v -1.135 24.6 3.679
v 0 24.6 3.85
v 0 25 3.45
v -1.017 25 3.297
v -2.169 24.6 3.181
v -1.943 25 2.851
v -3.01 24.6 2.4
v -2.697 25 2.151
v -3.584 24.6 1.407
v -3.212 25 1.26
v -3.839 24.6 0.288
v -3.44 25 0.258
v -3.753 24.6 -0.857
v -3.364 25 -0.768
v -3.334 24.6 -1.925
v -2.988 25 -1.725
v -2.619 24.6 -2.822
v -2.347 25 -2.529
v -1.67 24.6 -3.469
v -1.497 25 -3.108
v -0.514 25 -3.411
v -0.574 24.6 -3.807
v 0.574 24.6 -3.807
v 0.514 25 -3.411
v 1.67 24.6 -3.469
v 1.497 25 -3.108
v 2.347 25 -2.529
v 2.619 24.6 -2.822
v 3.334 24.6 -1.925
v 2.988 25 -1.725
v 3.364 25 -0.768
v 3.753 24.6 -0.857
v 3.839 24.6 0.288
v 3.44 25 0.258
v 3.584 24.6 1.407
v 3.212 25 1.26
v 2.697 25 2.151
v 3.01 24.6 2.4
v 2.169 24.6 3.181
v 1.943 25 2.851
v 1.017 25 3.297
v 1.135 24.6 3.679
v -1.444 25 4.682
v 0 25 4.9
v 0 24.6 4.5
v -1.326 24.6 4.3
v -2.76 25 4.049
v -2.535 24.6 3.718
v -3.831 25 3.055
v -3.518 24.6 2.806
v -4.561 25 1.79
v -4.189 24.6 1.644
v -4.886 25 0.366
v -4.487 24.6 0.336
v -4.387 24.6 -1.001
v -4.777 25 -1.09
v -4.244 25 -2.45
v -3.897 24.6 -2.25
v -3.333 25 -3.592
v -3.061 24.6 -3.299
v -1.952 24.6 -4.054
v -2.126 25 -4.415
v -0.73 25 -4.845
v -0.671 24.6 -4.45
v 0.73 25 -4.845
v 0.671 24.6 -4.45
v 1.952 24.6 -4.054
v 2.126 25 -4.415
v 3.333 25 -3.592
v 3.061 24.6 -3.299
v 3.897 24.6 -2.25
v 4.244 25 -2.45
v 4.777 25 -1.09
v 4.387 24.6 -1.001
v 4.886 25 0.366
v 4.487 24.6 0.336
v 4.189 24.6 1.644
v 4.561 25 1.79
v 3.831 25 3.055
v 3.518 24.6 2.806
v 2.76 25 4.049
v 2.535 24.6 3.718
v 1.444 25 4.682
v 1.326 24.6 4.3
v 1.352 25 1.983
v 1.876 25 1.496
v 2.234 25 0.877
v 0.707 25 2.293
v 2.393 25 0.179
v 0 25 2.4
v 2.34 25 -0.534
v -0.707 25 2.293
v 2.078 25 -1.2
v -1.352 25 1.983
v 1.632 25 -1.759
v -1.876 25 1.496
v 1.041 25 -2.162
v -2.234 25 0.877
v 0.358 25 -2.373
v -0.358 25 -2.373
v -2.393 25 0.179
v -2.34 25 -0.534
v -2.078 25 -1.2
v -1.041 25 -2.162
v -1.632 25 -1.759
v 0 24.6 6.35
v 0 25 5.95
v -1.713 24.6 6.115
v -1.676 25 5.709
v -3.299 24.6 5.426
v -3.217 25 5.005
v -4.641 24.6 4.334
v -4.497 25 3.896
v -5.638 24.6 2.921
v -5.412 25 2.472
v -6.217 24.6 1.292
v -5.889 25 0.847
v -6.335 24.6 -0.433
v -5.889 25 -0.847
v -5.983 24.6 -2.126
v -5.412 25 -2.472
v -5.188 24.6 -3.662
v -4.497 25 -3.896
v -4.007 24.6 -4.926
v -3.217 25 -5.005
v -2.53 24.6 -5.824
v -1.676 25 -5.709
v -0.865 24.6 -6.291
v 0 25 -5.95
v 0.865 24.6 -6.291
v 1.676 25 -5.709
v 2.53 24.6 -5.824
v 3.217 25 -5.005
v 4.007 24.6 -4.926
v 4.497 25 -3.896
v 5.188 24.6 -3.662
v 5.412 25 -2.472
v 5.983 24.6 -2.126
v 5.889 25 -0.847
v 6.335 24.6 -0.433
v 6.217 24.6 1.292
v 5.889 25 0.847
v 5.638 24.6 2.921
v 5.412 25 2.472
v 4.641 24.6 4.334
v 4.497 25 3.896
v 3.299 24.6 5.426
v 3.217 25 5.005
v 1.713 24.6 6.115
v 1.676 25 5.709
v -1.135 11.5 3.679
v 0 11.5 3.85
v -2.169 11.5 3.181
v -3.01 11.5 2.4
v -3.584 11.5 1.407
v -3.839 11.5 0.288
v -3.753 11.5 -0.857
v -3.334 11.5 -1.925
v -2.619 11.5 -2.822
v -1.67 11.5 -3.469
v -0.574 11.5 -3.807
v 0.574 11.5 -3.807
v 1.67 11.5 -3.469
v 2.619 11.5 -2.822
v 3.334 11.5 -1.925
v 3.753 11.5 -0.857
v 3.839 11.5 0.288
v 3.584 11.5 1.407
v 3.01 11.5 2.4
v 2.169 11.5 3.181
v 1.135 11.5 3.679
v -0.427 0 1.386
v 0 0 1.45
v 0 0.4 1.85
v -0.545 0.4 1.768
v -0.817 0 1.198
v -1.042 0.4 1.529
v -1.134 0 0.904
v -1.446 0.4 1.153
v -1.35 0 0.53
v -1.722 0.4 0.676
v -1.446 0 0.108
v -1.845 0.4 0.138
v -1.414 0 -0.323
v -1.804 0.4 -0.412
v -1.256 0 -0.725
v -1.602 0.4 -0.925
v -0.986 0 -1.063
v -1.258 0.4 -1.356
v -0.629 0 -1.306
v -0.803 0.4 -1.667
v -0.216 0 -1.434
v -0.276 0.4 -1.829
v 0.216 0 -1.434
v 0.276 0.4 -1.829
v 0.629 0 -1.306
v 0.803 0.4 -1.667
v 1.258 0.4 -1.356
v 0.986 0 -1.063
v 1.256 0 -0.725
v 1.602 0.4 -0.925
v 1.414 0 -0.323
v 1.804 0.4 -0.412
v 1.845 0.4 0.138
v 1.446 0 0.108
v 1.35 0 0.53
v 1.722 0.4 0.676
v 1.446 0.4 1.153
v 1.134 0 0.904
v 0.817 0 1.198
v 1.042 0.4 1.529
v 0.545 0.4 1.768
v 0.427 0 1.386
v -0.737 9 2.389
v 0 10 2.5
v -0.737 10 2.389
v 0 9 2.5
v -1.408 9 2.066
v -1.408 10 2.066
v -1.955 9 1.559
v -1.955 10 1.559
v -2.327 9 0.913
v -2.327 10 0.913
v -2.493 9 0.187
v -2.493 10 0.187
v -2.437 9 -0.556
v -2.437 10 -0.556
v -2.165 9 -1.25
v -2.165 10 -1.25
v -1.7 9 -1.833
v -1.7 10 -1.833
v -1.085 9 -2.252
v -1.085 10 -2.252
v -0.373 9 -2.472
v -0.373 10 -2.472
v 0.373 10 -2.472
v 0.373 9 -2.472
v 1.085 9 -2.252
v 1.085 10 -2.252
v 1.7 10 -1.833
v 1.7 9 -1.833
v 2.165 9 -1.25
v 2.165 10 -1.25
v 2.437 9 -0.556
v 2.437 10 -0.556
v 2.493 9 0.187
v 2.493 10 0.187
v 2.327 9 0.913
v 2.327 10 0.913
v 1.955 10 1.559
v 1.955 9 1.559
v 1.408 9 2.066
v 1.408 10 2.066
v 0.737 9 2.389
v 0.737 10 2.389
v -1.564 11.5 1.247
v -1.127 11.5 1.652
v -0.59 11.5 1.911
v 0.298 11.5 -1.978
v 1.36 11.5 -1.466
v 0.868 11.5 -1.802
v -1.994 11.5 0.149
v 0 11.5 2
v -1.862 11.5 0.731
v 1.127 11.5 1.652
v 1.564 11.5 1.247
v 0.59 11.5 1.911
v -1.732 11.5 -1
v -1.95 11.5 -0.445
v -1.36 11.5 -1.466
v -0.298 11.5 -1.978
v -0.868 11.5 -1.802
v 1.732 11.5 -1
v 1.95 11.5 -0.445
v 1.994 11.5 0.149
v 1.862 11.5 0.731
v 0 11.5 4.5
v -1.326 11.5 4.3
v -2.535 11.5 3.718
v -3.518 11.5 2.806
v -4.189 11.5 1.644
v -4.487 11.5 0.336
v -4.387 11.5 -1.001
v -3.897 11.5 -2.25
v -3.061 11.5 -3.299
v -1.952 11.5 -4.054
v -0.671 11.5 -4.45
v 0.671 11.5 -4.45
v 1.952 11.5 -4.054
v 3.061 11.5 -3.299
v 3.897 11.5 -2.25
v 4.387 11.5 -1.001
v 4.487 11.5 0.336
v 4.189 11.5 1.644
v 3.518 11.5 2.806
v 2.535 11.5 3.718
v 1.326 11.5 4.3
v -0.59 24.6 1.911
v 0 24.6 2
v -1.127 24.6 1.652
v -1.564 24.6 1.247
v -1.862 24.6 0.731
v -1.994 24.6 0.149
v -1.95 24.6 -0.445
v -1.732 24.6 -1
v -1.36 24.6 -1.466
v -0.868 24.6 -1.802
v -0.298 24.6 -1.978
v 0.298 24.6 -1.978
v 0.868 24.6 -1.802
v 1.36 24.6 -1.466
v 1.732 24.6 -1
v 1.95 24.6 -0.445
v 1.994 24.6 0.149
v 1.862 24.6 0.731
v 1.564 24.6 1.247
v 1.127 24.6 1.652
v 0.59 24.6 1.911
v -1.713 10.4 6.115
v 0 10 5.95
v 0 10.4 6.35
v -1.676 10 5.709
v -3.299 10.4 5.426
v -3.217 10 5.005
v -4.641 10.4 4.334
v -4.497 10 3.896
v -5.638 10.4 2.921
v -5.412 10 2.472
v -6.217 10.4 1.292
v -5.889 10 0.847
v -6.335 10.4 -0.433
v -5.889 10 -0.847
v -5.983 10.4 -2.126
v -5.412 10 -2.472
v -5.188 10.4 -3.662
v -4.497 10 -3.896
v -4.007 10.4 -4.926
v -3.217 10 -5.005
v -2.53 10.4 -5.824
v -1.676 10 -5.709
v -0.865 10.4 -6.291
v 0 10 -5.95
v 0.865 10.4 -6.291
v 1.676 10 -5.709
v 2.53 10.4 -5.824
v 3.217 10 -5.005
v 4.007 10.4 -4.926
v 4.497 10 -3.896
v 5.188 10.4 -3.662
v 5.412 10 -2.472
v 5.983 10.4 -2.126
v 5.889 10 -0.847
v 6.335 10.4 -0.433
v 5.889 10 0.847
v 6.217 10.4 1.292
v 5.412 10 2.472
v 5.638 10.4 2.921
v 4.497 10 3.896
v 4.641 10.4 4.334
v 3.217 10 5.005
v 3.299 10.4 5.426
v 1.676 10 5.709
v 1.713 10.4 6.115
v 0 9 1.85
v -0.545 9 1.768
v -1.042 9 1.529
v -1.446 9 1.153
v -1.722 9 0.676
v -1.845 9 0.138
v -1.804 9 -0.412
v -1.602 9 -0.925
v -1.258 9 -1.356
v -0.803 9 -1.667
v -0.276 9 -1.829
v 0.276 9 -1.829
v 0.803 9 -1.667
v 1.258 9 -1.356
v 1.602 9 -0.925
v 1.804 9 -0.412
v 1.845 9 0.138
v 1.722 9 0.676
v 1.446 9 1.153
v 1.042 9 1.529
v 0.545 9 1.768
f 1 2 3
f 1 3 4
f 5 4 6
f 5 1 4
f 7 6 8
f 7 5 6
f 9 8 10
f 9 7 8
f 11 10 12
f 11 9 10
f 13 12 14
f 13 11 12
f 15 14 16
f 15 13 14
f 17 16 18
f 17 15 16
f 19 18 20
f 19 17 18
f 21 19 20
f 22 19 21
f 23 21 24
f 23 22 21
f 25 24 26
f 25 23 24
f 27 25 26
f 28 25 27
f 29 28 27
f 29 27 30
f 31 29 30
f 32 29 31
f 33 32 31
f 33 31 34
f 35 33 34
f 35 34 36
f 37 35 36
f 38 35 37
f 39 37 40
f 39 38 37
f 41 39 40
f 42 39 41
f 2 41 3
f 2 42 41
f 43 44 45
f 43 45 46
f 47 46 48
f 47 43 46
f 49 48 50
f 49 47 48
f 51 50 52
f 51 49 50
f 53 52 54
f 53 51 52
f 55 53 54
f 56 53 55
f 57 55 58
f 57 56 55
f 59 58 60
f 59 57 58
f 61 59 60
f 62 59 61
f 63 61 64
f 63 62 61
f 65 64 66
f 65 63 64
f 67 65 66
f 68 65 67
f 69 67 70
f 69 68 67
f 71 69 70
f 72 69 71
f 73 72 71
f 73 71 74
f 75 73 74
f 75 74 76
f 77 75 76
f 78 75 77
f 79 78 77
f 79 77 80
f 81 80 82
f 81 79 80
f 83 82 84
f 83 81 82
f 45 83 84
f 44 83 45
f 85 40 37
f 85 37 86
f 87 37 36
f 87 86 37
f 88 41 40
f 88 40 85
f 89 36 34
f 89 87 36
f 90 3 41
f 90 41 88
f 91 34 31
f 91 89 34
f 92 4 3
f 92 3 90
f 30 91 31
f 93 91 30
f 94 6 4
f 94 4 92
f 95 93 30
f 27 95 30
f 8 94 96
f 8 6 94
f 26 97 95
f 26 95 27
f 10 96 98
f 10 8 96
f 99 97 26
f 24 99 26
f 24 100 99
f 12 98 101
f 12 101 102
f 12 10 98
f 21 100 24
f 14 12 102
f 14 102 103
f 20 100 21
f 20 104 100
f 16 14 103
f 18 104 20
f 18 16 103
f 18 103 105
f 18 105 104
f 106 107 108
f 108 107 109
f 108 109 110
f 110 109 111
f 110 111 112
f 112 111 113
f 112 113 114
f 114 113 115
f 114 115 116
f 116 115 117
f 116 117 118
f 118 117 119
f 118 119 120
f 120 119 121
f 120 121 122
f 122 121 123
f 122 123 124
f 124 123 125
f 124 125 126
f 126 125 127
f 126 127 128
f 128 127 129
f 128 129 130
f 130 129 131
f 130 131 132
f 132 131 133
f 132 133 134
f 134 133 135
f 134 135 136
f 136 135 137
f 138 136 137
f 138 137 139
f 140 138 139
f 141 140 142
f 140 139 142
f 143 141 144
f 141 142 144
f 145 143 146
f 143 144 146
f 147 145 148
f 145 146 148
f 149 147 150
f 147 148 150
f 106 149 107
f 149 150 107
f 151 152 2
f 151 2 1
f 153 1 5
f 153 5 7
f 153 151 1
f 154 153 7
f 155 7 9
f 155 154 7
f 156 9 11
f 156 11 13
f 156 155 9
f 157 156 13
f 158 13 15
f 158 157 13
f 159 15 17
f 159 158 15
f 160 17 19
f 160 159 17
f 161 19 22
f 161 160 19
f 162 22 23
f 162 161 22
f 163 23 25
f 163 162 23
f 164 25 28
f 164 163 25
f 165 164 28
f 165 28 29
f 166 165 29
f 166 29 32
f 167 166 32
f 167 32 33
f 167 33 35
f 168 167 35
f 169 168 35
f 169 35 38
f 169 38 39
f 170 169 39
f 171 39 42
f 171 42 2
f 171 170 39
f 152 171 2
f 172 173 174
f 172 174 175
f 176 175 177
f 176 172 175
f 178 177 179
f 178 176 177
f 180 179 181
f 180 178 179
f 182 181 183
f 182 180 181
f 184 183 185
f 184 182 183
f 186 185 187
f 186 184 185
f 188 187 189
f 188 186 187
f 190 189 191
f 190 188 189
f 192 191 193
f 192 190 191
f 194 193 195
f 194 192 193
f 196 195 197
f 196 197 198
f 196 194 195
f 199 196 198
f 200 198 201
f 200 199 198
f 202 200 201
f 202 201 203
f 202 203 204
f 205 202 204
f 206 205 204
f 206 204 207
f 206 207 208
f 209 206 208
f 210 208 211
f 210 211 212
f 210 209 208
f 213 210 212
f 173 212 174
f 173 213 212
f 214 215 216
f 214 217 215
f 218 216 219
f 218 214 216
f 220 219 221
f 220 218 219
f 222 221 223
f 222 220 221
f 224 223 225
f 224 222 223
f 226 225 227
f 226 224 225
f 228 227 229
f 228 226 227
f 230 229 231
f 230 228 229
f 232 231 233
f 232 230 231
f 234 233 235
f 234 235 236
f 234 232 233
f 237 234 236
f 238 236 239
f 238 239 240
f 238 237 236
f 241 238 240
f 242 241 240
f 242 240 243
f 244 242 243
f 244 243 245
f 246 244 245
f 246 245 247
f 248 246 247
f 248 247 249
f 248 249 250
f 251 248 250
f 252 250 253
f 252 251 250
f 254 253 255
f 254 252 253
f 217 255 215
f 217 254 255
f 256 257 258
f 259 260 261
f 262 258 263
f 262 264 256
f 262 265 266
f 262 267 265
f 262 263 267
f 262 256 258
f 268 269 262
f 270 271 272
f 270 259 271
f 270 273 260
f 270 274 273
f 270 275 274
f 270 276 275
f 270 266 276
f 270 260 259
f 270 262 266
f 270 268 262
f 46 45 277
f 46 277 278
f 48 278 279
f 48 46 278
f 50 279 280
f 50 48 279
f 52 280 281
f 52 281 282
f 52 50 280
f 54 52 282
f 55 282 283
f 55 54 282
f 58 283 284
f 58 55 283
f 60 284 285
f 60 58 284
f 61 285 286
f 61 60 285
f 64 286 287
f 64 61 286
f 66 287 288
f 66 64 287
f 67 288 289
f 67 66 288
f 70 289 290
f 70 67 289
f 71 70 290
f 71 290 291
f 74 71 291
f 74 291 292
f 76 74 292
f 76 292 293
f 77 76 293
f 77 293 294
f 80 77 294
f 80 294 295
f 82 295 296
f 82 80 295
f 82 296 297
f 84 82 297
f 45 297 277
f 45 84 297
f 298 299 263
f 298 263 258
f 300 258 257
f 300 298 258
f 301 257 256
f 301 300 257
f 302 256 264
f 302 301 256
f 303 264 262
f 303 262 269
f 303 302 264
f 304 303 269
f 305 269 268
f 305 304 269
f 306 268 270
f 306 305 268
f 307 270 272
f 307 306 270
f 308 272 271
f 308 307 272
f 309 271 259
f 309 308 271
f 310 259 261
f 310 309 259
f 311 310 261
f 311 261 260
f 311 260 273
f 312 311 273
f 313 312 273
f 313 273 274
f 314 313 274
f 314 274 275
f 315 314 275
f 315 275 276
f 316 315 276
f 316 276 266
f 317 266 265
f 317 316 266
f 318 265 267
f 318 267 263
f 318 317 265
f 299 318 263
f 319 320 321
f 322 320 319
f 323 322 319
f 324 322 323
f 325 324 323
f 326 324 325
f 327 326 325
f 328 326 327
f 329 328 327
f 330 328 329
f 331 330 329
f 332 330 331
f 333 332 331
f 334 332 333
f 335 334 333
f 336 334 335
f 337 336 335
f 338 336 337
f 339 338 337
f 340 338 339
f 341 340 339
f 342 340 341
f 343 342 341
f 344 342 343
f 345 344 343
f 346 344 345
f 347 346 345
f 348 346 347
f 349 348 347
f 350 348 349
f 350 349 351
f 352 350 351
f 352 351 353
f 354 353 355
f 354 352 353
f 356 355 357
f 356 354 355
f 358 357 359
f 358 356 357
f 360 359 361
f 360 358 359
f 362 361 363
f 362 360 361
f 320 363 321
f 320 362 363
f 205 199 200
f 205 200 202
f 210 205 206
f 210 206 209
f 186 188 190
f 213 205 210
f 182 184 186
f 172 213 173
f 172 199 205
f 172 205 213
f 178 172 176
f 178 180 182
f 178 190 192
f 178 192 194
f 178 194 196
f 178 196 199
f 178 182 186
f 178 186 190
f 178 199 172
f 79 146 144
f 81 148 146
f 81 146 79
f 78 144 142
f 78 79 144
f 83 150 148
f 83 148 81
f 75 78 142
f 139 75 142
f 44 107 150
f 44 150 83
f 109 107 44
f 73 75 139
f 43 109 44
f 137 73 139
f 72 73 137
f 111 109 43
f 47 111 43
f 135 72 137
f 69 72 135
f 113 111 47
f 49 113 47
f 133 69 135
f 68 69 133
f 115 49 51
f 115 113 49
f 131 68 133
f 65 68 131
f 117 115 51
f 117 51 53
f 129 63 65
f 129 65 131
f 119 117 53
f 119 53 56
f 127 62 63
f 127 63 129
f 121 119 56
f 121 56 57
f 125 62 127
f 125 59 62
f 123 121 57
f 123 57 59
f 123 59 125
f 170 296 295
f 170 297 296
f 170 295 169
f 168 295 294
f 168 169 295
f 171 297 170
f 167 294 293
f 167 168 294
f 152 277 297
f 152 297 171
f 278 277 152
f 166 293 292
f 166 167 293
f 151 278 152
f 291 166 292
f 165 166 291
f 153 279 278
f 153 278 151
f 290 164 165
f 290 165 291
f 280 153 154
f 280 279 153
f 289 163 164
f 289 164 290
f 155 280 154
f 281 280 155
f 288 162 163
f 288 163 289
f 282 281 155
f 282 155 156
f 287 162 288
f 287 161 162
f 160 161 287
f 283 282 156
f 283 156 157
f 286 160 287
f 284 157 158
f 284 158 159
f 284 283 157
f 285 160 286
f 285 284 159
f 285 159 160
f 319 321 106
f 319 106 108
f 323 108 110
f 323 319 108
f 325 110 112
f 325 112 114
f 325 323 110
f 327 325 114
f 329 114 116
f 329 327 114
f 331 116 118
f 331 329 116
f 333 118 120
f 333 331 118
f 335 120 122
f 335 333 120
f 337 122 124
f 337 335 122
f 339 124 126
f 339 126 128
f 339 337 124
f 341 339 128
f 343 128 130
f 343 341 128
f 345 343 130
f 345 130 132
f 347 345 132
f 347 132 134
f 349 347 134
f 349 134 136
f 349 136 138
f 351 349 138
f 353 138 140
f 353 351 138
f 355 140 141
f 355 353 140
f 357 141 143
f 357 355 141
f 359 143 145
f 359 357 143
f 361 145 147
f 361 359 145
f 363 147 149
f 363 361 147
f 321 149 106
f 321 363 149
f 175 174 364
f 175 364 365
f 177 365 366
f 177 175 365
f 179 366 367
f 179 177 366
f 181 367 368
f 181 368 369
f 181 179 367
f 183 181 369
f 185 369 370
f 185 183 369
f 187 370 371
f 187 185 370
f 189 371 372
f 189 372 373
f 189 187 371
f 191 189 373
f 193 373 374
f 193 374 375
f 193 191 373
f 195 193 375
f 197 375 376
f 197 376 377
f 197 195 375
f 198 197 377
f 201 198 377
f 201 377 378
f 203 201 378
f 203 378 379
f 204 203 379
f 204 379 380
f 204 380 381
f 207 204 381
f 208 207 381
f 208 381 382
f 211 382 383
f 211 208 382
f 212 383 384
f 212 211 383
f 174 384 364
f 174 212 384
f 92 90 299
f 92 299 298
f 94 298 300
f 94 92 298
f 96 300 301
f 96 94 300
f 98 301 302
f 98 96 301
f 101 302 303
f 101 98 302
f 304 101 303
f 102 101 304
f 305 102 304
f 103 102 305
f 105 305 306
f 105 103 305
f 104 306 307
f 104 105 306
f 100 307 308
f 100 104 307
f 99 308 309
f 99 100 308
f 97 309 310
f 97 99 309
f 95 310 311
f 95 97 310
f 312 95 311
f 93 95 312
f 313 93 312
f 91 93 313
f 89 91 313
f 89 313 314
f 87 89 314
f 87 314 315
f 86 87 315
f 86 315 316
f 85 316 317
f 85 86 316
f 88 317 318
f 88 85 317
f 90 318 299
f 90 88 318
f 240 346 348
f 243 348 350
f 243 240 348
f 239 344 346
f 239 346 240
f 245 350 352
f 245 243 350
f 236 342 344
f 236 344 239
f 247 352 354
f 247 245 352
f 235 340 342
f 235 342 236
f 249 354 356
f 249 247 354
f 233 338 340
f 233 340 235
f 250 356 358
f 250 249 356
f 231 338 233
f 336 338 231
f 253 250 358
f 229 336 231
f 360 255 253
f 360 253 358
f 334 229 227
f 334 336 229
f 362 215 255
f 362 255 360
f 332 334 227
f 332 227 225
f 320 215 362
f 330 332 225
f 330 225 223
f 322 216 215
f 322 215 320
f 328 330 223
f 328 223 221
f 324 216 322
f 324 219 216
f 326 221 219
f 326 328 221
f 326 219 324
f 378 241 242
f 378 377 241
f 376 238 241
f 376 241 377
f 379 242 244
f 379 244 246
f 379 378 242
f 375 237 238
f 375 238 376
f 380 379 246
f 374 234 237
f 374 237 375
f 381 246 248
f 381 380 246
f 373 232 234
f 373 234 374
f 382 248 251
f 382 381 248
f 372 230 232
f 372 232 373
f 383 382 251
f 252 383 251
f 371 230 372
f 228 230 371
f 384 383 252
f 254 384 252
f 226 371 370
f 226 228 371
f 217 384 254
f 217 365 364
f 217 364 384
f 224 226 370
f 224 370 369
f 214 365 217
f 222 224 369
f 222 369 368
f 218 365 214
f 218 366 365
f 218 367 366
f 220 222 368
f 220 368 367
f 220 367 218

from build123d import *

# Parameters (mm, degrees)
CHAMFER_2_SIZE = 0.4


with BuildPart() as part:
    # Эскиз1 → Повернуть1 (revolve)
    with BuildSketch(Plane.XY, mode=Mode.PRIVATE) as revolve_1_sk:
        Polygon((-6.35, 25), (-6.35, 10), (-2.5, 10), (-2.5, 9), (-1.85, 9), (-1.85, 0), (0, 0), (0, 11.499600798), (-2, 11.499600798), (-2, 25), (-3.85, 25), (-3.85, 11.499600798), (-4.5, 11.499600798), (-4.5, 25), align=None)
    revolve(revolve_1_sk.sketch.rotate(Axis((0, 11.499600798, 0), (0, -1, 0)), 270), axis=Axis((0, 11.499600798, 0), (0, -1, 0)))

    # Фаска2
    chamfer_2_edges = [part.edges().sort_by_distance(p)[0] for p in [
        (0, 0, -1.85),
        (0, 10, -6.35),
        (0, 25, -6.35),
        (0, 25, -4.5),
        (0, 25, -3.85),
        (0, 25, -2),
    ]]
    chamfer(chamfer_2_edges, length=CHAMFER_2_SIZE)


solid = part.part
